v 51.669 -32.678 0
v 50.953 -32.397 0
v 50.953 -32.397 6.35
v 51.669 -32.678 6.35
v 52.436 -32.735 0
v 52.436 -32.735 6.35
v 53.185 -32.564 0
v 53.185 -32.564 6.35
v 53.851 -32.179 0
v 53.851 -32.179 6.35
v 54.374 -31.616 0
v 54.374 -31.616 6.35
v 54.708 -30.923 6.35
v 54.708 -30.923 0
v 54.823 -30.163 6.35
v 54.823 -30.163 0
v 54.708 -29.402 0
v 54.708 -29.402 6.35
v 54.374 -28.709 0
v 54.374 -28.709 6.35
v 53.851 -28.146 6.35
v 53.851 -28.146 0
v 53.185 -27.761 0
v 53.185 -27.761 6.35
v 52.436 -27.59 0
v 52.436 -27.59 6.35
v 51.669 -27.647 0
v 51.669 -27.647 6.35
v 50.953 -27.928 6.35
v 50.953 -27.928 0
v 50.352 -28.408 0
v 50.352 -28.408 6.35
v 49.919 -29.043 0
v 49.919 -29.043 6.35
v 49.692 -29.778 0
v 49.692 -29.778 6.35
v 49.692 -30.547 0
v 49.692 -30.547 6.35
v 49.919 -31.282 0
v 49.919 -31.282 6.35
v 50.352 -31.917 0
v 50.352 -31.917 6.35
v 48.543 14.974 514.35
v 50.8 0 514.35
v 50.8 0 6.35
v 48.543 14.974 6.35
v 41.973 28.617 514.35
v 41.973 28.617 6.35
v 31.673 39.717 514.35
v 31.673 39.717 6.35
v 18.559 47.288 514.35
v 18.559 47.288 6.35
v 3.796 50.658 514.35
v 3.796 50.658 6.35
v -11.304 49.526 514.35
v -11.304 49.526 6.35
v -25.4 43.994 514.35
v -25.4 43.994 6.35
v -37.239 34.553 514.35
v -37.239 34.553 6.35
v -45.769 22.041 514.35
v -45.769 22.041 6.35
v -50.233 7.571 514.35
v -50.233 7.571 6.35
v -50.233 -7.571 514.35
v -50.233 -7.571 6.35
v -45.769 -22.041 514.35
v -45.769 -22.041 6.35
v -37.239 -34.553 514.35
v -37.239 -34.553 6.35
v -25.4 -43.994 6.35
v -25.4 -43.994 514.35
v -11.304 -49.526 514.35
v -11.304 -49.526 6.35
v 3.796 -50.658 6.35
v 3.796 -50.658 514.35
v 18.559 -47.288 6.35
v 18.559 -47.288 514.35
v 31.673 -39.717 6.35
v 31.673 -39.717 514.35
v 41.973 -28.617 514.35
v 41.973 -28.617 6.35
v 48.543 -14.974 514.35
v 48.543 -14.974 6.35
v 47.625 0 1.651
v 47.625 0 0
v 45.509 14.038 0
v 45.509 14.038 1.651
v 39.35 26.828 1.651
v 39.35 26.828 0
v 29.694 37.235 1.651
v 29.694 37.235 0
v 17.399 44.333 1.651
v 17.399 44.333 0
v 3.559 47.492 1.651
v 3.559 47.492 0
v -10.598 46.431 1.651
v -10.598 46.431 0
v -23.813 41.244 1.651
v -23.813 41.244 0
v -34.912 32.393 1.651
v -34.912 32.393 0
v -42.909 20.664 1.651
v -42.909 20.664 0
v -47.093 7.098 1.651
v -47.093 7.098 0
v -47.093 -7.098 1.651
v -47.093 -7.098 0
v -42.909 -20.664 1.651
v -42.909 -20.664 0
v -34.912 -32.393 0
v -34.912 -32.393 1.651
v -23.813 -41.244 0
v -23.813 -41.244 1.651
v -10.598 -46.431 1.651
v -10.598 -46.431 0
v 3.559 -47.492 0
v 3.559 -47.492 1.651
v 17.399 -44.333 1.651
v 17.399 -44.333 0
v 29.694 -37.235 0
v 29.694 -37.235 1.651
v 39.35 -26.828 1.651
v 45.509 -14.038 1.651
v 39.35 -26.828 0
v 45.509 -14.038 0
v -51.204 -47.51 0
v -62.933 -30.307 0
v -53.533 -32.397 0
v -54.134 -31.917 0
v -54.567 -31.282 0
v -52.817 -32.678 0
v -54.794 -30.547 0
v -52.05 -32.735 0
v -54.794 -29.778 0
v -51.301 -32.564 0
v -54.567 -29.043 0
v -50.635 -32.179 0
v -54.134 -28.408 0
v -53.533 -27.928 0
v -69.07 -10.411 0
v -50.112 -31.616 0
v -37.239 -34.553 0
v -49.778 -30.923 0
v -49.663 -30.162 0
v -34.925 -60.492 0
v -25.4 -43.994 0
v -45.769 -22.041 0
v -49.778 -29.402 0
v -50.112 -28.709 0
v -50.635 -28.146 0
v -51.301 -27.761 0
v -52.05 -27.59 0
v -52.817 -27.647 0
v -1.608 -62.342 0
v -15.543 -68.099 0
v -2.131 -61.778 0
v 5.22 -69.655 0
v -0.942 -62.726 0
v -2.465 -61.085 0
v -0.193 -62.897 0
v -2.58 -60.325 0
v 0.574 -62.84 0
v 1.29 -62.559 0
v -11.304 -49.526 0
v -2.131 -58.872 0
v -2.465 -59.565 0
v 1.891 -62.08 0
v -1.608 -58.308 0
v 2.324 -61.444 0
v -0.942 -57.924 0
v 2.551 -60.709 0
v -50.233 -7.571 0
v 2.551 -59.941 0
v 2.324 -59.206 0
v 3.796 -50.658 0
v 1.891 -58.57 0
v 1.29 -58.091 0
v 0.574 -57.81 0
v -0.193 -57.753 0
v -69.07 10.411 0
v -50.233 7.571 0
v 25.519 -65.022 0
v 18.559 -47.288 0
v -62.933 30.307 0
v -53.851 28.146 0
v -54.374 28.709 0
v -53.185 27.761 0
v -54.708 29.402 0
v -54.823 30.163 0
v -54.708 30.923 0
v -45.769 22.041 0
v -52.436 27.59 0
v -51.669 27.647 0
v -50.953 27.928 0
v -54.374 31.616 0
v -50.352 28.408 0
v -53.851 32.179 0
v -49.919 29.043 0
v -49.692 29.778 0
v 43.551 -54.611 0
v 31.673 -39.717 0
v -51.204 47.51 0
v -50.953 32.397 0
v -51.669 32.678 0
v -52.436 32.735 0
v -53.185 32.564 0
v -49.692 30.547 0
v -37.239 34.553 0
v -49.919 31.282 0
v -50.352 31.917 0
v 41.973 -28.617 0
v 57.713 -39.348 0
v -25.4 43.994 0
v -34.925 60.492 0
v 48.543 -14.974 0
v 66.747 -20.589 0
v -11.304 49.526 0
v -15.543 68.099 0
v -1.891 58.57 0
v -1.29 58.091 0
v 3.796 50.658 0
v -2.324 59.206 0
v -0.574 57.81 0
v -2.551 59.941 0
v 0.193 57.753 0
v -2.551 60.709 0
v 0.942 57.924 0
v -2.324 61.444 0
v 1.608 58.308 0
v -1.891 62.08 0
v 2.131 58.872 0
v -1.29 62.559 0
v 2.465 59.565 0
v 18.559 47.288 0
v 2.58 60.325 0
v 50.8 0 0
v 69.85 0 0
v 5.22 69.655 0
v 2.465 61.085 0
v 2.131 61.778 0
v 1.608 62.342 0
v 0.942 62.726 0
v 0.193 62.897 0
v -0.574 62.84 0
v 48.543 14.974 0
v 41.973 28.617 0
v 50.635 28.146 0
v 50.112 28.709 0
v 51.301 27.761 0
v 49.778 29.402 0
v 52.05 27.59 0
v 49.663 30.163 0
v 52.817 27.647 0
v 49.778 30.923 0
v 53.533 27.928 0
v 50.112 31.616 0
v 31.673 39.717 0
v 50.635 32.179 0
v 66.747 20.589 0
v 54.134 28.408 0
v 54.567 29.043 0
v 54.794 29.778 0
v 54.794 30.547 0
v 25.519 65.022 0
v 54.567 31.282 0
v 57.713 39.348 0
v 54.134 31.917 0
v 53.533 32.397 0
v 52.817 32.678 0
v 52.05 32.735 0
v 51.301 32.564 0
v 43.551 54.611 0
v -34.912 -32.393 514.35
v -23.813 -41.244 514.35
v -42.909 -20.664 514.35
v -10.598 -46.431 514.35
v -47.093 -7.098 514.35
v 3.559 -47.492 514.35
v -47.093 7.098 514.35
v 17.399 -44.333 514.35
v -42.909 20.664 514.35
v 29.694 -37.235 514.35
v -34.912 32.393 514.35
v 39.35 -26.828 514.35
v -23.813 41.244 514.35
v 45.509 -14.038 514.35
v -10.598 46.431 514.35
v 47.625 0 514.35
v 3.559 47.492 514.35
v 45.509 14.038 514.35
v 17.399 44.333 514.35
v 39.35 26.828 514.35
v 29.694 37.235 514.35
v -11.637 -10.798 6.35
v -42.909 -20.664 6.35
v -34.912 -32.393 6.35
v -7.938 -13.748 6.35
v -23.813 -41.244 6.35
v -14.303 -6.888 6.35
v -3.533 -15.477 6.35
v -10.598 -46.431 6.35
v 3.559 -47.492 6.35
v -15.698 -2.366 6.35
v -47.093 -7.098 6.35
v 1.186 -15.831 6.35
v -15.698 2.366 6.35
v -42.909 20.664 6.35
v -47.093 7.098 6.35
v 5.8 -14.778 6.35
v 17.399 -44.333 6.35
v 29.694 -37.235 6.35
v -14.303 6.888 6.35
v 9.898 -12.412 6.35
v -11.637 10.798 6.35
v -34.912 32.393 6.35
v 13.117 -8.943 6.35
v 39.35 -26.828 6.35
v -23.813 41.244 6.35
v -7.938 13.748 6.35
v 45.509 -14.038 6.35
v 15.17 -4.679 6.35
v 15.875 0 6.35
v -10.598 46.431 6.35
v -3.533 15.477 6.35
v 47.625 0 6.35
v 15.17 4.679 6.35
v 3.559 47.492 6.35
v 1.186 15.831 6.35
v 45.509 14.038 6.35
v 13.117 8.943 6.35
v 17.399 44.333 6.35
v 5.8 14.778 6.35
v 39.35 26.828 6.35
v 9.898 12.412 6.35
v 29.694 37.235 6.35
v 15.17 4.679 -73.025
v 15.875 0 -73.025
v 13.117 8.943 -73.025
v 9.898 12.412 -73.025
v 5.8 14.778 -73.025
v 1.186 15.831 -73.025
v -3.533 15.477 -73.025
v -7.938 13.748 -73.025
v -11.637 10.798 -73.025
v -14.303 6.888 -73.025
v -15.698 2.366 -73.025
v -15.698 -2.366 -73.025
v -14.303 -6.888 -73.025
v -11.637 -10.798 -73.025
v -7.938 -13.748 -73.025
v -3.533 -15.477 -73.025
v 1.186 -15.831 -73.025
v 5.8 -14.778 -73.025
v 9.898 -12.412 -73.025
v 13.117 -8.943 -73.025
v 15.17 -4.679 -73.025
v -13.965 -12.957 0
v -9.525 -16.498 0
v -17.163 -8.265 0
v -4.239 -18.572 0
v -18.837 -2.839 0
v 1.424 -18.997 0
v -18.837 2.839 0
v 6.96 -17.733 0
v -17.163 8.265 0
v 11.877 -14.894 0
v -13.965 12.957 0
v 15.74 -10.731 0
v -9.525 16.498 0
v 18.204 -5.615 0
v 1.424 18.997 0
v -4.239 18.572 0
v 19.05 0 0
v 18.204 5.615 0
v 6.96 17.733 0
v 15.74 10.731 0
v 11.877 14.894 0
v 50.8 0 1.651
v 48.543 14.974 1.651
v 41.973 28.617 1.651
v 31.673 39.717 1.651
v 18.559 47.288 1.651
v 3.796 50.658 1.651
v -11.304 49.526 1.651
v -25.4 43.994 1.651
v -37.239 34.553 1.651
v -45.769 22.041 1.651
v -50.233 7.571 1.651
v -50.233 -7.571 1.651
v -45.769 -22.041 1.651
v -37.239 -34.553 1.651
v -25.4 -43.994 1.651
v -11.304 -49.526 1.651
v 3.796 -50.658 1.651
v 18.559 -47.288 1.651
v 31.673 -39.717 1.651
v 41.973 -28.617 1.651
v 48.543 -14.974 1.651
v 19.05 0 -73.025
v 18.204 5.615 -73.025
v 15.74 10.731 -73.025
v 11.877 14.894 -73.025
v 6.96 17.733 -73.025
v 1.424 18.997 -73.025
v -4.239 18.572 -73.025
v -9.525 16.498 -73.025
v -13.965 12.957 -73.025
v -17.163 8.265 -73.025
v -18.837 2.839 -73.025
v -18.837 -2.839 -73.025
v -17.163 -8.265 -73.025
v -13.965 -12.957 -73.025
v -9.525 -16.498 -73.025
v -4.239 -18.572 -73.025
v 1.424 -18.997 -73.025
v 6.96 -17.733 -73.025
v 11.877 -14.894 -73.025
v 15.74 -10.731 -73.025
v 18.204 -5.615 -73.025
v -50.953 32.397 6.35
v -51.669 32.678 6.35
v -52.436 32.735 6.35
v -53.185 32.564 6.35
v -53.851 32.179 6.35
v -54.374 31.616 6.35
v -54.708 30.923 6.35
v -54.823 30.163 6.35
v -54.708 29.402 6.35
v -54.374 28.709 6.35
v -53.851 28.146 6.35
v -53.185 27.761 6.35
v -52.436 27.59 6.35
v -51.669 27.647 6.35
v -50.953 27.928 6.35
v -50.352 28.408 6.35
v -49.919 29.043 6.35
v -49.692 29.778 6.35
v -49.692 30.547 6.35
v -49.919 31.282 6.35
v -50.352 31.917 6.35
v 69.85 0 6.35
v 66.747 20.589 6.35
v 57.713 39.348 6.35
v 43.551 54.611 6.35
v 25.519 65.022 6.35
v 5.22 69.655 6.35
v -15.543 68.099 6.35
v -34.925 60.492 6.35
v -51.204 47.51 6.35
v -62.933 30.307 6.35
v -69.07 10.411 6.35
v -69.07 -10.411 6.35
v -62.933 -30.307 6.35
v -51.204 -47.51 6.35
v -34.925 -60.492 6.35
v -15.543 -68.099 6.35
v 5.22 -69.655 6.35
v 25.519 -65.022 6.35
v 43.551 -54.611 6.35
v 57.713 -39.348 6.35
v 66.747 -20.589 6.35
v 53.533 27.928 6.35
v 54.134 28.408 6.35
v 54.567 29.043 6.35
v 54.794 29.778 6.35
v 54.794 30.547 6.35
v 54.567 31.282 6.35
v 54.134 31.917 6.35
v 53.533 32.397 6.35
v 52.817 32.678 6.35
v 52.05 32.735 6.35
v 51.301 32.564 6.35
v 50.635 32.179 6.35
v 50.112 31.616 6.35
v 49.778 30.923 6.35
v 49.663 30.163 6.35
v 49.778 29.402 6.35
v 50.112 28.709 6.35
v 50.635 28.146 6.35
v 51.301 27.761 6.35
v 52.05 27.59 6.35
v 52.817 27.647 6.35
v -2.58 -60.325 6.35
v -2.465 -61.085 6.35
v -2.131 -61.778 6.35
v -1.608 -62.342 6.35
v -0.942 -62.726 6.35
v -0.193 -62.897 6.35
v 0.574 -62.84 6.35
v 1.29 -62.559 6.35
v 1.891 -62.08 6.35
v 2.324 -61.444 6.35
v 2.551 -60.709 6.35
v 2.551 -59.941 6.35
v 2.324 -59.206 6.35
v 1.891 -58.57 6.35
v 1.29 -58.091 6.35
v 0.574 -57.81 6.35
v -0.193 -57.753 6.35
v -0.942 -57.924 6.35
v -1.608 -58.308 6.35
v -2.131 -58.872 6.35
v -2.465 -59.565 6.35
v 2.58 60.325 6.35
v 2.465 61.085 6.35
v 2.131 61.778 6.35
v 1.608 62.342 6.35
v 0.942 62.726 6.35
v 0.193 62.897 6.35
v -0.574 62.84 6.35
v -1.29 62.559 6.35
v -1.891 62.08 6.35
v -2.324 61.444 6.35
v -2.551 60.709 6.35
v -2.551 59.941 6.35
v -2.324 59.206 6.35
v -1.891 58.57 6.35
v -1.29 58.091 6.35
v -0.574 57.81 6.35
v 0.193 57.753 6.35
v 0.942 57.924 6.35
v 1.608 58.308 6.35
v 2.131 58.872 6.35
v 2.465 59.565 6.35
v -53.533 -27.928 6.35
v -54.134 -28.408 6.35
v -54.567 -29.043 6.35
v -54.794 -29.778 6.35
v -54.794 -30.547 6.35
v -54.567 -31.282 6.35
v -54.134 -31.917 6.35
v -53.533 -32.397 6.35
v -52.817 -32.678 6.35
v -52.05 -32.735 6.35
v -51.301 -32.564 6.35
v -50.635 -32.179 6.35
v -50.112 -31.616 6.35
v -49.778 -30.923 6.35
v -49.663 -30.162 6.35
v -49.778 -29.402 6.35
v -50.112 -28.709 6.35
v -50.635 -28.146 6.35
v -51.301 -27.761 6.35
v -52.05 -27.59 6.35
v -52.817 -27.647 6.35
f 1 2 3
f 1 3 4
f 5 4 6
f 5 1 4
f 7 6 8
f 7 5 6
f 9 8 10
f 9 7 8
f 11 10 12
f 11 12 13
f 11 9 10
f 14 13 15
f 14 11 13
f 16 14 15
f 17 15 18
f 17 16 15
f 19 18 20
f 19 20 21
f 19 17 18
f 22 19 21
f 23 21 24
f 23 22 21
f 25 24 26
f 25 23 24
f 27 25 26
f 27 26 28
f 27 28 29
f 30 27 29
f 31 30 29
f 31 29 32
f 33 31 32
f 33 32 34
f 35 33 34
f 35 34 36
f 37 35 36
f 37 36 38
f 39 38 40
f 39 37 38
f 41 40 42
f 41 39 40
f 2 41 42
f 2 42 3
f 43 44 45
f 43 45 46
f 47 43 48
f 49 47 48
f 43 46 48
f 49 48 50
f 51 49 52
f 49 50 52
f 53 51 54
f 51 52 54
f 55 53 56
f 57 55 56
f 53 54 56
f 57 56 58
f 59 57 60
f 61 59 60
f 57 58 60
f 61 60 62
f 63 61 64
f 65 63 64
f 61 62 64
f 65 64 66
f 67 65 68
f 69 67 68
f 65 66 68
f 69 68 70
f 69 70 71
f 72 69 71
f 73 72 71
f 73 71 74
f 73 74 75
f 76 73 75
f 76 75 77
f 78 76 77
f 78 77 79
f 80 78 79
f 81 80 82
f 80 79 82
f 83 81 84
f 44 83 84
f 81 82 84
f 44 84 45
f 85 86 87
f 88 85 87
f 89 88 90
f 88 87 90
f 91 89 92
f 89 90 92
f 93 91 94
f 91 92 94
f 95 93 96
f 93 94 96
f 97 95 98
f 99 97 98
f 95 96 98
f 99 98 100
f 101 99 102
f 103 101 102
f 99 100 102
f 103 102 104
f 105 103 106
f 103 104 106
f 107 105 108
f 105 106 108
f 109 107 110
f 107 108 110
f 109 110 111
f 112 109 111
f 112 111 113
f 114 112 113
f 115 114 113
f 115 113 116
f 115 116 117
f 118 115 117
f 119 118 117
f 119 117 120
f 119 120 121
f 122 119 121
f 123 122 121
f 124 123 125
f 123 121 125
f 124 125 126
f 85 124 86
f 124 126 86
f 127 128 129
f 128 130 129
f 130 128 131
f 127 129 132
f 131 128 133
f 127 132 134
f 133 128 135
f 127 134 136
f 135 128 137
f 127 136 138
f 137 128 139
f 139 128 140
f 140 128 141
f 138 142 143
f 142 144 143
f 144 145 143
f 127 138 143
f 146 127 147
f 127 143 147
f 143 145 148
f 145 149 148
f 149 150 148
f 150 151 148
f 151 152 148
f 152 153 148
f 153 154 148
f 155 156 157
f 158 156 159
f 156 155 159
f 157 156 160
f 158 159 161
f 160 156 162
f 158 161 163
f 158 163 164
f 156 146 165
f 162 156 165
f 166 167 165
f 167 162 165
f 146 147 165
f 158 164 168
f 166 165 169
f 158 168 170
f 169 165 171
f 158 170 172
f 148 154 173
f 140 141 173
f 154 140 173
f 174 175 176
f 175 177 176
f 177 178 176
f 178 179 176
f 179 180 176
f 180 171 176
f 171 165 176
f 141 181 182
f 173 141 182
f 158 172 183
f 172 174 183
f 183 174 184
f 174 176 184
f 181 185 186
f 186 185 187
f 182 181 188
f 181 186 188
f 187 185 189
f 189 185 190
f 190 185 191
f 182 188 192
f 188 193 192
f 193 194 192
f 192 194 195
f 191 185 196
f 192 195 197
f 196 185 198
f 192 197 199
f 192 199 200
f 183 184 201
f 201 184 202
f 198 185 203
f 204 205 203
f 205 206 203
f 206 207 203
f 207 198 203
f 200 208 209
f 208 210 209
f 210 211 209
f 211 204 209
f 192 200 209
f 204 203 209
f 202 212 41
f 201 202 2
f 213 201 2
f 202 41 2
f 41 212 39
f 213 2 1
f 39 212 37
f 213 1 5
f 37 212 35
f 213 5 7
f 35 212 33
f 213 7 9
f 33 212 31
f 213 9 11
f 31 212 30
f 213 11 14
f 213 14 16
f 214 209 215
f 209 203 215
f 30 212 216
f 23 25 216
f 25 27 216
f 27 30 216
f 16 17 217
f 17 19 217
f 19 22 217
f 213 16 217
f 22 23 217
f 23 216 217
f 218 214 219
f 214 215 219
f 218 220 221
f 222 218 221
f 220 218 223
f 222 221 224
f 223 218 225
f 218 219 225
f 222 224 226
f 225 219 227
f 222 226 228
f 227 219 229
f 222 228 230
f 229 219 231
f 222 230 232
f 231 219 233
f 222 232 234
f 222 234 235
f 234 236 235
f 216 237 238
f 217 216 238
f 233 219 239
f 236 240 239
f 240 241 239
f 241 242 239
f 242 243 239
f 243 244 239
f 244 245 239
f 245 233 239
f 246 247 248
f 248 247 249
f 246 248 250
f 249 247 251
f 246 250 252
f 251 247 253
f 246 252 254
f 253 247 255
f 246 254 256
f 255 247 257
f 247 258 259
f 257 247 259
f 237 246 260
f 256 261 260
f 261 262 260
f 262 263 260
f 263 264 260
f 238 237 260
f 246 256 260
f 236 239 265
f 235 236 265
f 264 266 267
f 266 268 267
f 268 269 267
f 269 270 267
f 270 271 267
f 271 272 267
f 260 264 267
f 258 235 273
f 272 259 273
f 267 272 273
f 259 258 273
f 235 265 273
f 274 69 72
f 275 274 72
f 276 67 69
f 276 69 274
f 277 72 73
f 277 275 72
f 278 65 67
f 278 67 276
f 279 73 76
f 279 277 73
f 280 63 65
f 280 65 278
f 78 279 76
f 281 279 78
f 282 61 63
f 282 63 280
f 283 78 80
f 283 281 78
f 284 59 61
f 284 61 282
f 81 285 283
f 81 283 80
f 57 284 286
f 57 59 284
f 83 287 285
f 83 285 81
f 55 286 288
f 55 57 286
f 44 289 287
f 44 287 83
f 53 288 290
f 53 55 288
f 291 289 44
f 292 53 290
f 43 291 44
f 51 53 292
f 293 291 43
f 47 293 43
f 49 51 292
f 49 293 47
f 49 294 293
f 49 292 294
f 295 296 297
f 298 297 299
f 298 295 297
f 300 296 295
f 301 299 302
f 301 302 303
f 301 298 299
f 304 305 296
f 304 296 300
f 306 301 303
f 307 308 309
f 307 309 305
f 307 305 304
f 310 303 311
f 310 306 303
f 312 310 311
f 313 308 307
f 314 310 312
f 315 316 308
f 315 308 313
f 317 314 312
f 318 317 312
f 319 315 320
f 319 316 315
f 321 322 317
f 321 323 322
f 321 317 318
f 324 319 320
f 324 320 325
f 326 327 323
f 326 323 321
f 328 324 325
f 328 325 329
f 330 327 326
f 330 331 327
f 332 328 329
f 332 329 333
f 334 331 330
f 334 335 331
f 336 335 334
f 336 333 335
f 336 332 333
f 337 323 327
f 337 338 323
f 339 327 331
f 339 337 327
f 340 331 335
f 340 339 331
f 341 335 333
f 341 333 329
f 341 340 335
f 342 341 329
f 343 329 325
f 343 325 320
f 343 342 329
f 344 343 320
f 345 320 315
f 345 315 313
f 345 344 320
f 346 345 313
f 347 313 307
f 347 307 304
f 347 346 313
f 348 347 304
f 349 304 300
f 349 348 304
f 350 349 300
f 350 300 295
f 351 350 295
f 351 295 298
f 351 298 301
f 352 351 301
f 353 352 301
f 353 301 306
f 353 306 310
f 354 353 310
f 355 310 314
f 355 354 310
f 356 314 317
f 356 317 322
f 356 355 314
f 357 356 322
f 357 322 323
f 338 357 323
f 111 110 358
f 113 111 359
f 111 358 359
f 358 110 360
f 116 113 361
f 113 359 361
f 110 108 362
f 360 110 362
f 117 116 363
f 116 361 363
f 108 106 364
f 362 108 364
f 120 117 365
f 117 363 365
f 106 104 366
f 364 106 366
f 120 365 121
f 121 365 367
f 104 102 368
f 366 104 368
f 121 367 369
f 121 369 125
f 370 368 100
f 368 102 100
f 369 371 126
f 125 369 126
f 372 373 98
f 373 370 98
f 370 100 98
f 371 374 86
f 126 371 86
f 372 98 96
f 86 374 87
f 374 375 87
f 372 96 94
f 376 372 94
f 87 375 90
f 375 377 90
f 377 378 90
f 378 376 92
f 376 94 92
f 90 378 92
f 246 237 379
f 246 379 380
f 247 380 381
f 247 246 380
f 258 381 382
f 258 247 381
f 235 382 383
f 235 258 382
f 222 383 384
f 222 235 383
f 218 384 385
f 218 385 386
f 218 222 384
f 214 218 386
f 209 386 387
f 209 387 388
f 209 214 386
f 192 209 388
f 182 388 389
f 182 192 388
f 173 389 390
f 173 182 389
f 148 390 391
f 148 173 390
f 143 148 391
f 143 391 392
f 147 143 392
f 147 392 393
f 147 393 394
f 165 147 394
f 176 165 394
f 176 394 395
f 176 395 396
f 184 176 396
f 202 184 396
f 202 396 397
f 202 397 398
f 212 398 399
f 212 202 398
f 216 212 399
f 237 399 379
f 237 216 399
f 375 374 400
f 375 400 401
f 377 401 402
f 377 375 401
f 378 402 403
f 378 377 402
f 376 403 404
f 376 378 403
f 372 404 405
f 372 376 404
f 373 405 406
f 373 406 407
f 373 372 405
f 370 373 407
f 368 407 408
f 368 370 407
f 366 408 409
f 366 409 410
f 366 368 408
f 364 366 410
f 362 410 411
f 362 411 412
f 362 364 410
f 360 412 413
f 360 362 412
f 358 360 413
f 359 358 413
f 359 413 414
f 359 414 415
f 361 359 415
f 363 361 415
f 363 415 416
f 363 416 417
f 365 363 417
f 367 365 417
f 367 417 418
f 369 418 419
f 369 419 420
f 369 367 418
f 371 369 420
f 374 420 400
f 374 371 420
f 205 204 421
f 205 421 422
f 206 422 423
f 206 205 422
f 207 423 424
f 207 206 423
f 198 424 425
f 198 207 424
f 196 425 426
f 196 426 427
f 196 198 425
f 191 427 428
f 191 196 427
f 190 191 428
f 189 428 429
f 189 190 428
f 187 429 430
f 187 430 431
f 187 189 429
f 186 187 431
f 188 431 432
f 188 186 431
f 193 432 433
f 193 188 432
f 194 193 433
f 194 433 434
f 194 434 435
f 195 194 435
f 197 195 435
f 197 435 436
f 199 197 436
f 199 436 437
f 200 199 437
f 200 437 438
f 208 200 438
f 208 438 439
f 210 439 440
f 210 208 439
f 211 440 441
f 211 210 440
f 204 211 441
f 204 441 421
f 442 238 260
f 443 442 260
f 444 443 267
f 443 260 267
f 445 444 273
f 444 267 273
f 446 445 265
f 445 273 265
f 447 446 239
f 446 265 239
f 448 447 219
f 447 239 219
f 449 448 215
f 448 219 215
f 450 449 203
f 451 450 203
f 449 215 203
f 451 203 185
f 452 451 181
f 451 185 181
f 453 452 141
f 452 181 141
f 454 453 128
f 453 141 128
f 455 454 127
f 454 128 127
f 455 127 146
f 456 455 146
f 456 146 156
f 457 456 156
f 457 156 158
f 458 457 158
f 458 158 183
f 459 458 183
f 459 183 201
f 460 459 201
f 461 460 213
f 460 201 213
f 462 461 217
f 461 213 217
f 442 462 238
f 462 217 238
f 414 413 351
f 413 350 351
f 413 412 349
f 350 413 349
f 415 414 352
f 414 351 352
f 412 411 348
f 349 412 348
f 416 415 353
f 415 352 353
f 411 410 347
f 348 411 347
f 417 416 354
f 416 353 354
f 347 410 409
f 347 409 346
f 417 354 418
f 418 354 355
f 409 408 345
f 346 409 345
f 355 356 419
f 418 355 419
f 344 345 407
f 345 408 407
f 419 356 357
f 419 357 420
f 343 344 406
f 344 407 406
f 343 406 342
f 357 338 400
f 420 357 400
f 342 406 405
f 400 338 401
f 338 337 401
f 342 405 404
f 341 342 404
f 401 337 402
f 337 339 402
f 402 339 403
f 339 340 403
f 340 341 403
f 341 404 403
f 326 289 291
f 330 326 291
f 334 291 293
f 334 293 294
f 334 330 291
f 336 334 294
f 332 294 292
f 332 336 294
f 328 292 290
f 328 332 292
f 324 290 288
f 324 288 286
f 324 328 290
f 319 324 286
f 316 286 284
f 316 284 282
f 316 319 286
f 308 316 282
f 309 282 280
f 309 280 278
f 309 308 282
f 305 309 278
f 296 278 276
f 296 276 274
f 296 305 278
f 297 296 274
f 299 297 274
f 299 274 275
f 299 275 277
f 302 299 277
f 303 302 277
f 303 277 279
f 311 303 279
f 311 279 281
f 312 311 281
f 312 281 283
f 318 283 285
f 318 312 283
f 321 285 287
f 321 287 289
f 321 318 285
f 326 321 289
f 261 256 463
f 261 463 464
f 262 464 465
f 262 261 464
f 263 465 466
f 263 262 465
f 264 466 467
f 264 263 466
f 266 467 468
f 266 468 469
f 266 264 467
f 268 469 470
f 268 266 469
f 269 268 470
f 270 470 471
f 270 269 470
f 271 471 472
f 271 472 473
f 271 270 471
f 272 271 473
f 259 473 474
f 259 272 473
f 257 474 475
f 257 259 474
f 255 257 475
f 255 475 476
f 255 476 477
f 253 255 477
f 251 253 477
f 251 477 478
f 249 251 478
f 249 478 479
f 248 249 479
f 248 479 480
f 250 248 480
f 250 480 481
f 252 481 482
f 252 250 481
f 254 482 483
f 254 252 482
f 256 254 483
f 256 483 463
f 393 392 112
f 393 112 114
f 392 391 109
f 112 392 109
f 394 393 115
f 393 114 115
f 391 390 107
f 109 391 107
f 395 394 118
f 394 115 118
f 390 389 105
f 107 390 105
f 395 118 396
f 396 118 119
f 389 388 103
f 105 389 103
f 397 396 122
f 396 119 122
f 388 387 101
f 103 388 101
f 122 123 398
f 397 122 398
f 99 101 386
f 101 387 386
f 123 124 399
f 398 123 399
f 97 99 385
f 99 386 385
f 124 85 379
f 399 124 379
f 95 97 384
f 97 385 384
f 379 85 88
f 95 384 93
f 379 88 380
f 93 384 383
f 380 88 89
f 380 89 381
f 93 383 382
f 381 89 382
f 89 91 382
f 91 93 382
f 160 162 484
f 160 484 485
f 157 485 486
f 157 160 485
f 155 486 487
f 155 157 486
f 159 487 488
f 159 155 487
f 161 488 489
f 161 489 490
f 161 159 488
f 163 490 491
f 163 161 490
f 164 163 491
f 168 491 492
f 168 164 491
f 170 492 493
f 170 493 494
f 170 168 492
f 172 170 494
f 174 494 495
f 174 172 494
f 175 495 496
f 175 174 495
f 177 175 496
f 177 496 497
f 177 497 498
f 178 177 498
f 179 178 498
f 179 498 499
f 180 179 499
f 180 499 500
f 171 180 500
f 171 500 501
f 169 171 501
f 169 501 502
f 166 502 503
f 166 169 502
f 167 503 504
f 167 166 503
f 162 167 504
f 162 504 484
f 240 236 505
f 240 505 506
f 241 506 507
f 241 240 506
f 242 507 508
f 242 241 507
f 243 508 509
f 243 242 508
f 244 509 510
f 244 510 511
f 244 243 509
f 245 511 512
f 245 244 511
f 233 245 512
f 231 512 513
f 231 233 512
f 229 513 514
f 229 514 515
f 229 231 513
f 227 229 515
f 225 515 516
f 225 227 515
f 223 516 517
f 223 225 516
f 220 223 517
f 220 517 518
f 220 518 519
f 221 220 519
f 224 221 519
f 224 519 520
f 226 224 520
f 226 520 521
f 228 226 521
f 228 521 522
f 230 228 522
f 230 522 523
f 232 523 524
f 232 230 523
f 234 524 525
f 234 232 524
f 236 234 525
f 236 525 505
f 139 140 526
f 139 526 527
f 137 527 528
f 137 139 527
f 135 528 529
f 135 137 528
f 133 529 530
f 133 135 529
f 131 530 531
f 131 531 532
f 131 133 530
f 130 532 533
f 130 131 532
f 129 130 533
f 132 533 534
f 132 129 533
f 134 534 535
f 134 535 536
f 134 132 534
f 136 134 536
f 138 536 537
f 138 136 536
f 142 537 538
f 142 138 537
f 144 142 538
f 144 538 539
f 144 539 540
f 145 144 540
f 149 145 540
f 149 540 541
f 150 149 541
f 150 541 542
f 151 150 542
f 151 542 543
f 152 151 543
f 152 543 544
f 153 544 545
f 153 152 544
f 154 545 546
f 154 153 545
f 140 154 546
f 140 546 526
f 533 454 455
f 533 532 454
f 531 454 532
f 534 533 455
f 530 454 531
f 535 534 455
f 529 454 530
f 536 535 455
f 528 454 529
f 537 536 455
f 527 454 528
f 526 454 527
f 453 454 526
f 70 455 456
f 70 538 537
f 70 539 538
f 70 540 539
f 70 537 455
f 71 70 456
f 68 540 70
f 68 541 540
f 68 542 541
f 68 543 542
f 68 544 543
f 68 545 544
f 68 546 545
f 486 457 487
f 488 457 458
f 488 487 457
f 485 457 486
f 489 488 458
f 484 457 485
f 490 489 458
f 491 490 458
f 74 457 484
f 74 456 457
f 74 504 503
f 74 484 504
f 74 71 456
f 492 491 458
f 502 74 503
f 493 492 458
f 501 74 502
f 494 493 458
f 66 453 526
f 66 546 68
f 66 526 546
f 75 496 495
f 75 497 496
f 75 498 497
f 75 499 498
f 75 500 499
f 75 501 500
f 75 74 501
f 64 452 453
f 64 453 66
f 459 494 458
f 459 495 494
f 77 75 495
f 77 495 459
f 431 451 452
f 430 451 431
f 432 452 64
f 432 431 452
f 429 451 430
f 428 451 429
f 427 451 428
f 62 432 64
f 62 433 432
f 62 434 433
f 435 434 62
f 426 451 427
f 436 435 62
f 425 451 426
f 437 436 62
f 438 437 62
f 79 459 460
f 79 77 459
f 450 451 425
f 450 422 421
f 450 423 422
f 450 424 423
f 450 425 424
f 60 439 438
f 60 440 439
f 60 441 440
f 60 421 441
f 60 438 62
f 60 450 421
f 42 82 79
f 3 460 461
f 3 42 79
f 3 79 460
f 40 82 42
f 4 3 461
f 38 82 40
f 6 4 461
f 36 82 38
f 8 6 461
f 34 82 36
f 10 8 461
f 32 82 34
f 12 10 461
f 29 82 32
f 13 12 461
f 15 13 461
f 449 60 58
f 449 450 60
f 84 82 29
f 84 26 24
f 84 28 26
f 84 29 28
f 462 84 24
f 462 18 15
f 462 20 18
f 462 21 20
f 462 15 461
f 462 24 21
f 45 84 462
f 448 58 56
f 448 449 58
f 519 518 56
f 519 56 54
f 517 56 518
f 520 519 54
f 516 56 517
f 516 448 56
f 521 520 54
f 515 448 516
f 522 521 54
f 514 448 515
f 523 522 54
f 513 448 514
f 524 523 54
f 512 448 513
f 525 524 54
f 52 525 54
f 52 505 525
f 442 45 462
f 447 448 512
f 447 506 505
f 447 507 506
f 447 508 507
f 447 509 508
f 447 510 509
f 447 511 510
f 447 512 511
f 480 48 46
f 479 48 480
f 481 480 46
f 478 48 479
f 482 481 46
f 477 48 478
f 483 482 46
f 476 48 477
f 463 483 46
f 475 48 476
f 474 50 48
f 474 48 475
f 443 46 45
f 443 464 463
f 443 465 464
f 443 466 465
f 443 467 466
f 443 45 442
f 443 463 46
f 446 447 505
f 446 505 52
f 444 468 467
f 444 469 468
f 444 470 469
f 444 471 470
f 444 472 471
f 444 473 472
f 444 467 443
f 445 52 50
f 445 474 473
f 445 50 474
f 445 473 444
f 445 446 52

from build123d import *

# Parameters (mm, degrees)
SKETCH1_R            = 19.05
SKETCH1_R_2          = 15.875
EXTRUDE1_DEPTH       = 6.35
EXTRUDE1_DEPTH_BACK  = 73.025
SKETCH1_4_R          = 47.625
SKETCH1_4_R_2        = 19.05
EXTRUDE3_DEPTH       = 6.35
SKETCH1_6_R          = 69.85
SKETCH1_6_R_2        = 50.8
SKETCH1_6_R_3        = 2.5796875
EXTRUDE5_DEPTH       = 6.35
SKETCH1_9_R          = 50.8
SKETCH1_9_R_2        = 47.625
EXTRUDE8_DEPTH       = 5.08
SKETCH1_10_R         = 50.8
SKETCH1_10_R_2       = 47.625
CUT_EXTRUDE1_DEPTH   = 1.651
SKETCH1_13_R         = 2.5796875
EXTRUDE9_DEPTH       = 6.35
SKETCH1_14_R         = 2.5796875
CUT_EXTRUDE5_DEPTH   = 6.35
CIRPATTERN1_COUNT    = 6
SKETCH5_R            = 50.8
SKETCH5_R_2          = 47.625
EXTRUDE11_DEPTH      = 508
EXTRUDE11_DEPTH_BACK = 1.651


with BuildPart() as part:
    # Sketch1 → Extrude1 (new body, two sides)
    with BuildSketch(Plane.XY) as extrude1_sk:
        Circle(SKETCH1_R)
        Circle(SKETCH1_R_2, mode=Mode.SUBTRACT)
    extrude(amount=EXTRUDE1_DEPTH)
    extrude(extrude1_sk.sketch, amount=-EXTRUDE1_DEPTH_BACK)

    # Sketch1_4 → Extrude3 (add)
    with BuildSketch(Plane.XY):
        Circle(SKETCH1_4_R)
        Circle(SKETCH1_4_R_2, mode=Mode.SUBTRACT)
    extrude(amount=EXTRUDE3_DEPTH)



with BuildPart() as body_2:
    # Sketch1_6 → Extrude5 (new body)
    with BuildSketch(Plane.XY):
        Circle(SKETCH1_6_R)
        Circle(SKETCH1_6_R_2, mode=Mode.SUBTRACT)
        with Locations((0, 60.325)):
            Circle(SKETCH1_6_R_3, mode=Mode.SUBTRACT)
    extrude(amount=EXTRUDE5_DEPTH)


with BuildPart() as part_1:
    add(part.part)

    add(body_2.part)  # Extrude8 merges body 2
    # Sketch1_9 → Extrude8 (add)
    with BuildSketch(Plane.XY):
        Circle(SKETCH1_9_R)
        Circle(SKETCH1_9_R_2, mode=Mode.SUBTRACT)
    extrude(amount=EXTRUDE8_DEPTH)

    # Sketch1_10 → Cut-Extrude1 (cut)
    with BuildSketch(Plane.XY):
        Circle(SKETCH1_10_R)
        Circle(SKETCH1_10_R_2, mode=Mode.SUBTRACT)
    extrude(amount=CUT_EXTRUDE1_DEPTH, mode=Mode.SUBTRACT)

    # Sketch1_13 → Extrude9 (add)
    with BuildSketch(Plane.XY):
        with Locations((0, 60.325)):
            Circle(SKETCH1_13_R)
    extrude(amount=EXTRUDE9_DEPTH)

    # Sketch1_14 → Cut-Extrude5 (cut)
    with BuildSketch(Plane.XY):
        with Locations((0, 60.325)):
            Circle(SKETCH1_14_R)
    cut_extrude5 = extrude(amount=CUT_EXTRUDE5_DEPTH, mode=Mode.SUBTRACT)

    # CirPattern1: Cut-Extrude5 ×6 about axis
    cirpattern1_axis = Axis((0, 0, 0), (0, 0, 1))
    for i in range(1, CIRPATTERN1_COUNT):
        add(cut_extrude5.rotate(cirpattern1_axis, i * 360 / CIRPATTERN1_COUNT), mode=Mode.SUBTRACT)

    # Sketch5 → Extrude11 (add, two sides)
    with BuildSketch(Plane.XY.offset(6.35)) as extrude11_sk:
        Circle(SKETCH5_R)
        Circle(SKETCH5_R_2, mode=Mode.SUBTRACT)
    extrude(amount=EXTRUDE11_DEPTH)
    extrude(extrude11_sk.sketch, amount=-EXTRUDE11_DEPTH_BACK)


solid = part_1.part
